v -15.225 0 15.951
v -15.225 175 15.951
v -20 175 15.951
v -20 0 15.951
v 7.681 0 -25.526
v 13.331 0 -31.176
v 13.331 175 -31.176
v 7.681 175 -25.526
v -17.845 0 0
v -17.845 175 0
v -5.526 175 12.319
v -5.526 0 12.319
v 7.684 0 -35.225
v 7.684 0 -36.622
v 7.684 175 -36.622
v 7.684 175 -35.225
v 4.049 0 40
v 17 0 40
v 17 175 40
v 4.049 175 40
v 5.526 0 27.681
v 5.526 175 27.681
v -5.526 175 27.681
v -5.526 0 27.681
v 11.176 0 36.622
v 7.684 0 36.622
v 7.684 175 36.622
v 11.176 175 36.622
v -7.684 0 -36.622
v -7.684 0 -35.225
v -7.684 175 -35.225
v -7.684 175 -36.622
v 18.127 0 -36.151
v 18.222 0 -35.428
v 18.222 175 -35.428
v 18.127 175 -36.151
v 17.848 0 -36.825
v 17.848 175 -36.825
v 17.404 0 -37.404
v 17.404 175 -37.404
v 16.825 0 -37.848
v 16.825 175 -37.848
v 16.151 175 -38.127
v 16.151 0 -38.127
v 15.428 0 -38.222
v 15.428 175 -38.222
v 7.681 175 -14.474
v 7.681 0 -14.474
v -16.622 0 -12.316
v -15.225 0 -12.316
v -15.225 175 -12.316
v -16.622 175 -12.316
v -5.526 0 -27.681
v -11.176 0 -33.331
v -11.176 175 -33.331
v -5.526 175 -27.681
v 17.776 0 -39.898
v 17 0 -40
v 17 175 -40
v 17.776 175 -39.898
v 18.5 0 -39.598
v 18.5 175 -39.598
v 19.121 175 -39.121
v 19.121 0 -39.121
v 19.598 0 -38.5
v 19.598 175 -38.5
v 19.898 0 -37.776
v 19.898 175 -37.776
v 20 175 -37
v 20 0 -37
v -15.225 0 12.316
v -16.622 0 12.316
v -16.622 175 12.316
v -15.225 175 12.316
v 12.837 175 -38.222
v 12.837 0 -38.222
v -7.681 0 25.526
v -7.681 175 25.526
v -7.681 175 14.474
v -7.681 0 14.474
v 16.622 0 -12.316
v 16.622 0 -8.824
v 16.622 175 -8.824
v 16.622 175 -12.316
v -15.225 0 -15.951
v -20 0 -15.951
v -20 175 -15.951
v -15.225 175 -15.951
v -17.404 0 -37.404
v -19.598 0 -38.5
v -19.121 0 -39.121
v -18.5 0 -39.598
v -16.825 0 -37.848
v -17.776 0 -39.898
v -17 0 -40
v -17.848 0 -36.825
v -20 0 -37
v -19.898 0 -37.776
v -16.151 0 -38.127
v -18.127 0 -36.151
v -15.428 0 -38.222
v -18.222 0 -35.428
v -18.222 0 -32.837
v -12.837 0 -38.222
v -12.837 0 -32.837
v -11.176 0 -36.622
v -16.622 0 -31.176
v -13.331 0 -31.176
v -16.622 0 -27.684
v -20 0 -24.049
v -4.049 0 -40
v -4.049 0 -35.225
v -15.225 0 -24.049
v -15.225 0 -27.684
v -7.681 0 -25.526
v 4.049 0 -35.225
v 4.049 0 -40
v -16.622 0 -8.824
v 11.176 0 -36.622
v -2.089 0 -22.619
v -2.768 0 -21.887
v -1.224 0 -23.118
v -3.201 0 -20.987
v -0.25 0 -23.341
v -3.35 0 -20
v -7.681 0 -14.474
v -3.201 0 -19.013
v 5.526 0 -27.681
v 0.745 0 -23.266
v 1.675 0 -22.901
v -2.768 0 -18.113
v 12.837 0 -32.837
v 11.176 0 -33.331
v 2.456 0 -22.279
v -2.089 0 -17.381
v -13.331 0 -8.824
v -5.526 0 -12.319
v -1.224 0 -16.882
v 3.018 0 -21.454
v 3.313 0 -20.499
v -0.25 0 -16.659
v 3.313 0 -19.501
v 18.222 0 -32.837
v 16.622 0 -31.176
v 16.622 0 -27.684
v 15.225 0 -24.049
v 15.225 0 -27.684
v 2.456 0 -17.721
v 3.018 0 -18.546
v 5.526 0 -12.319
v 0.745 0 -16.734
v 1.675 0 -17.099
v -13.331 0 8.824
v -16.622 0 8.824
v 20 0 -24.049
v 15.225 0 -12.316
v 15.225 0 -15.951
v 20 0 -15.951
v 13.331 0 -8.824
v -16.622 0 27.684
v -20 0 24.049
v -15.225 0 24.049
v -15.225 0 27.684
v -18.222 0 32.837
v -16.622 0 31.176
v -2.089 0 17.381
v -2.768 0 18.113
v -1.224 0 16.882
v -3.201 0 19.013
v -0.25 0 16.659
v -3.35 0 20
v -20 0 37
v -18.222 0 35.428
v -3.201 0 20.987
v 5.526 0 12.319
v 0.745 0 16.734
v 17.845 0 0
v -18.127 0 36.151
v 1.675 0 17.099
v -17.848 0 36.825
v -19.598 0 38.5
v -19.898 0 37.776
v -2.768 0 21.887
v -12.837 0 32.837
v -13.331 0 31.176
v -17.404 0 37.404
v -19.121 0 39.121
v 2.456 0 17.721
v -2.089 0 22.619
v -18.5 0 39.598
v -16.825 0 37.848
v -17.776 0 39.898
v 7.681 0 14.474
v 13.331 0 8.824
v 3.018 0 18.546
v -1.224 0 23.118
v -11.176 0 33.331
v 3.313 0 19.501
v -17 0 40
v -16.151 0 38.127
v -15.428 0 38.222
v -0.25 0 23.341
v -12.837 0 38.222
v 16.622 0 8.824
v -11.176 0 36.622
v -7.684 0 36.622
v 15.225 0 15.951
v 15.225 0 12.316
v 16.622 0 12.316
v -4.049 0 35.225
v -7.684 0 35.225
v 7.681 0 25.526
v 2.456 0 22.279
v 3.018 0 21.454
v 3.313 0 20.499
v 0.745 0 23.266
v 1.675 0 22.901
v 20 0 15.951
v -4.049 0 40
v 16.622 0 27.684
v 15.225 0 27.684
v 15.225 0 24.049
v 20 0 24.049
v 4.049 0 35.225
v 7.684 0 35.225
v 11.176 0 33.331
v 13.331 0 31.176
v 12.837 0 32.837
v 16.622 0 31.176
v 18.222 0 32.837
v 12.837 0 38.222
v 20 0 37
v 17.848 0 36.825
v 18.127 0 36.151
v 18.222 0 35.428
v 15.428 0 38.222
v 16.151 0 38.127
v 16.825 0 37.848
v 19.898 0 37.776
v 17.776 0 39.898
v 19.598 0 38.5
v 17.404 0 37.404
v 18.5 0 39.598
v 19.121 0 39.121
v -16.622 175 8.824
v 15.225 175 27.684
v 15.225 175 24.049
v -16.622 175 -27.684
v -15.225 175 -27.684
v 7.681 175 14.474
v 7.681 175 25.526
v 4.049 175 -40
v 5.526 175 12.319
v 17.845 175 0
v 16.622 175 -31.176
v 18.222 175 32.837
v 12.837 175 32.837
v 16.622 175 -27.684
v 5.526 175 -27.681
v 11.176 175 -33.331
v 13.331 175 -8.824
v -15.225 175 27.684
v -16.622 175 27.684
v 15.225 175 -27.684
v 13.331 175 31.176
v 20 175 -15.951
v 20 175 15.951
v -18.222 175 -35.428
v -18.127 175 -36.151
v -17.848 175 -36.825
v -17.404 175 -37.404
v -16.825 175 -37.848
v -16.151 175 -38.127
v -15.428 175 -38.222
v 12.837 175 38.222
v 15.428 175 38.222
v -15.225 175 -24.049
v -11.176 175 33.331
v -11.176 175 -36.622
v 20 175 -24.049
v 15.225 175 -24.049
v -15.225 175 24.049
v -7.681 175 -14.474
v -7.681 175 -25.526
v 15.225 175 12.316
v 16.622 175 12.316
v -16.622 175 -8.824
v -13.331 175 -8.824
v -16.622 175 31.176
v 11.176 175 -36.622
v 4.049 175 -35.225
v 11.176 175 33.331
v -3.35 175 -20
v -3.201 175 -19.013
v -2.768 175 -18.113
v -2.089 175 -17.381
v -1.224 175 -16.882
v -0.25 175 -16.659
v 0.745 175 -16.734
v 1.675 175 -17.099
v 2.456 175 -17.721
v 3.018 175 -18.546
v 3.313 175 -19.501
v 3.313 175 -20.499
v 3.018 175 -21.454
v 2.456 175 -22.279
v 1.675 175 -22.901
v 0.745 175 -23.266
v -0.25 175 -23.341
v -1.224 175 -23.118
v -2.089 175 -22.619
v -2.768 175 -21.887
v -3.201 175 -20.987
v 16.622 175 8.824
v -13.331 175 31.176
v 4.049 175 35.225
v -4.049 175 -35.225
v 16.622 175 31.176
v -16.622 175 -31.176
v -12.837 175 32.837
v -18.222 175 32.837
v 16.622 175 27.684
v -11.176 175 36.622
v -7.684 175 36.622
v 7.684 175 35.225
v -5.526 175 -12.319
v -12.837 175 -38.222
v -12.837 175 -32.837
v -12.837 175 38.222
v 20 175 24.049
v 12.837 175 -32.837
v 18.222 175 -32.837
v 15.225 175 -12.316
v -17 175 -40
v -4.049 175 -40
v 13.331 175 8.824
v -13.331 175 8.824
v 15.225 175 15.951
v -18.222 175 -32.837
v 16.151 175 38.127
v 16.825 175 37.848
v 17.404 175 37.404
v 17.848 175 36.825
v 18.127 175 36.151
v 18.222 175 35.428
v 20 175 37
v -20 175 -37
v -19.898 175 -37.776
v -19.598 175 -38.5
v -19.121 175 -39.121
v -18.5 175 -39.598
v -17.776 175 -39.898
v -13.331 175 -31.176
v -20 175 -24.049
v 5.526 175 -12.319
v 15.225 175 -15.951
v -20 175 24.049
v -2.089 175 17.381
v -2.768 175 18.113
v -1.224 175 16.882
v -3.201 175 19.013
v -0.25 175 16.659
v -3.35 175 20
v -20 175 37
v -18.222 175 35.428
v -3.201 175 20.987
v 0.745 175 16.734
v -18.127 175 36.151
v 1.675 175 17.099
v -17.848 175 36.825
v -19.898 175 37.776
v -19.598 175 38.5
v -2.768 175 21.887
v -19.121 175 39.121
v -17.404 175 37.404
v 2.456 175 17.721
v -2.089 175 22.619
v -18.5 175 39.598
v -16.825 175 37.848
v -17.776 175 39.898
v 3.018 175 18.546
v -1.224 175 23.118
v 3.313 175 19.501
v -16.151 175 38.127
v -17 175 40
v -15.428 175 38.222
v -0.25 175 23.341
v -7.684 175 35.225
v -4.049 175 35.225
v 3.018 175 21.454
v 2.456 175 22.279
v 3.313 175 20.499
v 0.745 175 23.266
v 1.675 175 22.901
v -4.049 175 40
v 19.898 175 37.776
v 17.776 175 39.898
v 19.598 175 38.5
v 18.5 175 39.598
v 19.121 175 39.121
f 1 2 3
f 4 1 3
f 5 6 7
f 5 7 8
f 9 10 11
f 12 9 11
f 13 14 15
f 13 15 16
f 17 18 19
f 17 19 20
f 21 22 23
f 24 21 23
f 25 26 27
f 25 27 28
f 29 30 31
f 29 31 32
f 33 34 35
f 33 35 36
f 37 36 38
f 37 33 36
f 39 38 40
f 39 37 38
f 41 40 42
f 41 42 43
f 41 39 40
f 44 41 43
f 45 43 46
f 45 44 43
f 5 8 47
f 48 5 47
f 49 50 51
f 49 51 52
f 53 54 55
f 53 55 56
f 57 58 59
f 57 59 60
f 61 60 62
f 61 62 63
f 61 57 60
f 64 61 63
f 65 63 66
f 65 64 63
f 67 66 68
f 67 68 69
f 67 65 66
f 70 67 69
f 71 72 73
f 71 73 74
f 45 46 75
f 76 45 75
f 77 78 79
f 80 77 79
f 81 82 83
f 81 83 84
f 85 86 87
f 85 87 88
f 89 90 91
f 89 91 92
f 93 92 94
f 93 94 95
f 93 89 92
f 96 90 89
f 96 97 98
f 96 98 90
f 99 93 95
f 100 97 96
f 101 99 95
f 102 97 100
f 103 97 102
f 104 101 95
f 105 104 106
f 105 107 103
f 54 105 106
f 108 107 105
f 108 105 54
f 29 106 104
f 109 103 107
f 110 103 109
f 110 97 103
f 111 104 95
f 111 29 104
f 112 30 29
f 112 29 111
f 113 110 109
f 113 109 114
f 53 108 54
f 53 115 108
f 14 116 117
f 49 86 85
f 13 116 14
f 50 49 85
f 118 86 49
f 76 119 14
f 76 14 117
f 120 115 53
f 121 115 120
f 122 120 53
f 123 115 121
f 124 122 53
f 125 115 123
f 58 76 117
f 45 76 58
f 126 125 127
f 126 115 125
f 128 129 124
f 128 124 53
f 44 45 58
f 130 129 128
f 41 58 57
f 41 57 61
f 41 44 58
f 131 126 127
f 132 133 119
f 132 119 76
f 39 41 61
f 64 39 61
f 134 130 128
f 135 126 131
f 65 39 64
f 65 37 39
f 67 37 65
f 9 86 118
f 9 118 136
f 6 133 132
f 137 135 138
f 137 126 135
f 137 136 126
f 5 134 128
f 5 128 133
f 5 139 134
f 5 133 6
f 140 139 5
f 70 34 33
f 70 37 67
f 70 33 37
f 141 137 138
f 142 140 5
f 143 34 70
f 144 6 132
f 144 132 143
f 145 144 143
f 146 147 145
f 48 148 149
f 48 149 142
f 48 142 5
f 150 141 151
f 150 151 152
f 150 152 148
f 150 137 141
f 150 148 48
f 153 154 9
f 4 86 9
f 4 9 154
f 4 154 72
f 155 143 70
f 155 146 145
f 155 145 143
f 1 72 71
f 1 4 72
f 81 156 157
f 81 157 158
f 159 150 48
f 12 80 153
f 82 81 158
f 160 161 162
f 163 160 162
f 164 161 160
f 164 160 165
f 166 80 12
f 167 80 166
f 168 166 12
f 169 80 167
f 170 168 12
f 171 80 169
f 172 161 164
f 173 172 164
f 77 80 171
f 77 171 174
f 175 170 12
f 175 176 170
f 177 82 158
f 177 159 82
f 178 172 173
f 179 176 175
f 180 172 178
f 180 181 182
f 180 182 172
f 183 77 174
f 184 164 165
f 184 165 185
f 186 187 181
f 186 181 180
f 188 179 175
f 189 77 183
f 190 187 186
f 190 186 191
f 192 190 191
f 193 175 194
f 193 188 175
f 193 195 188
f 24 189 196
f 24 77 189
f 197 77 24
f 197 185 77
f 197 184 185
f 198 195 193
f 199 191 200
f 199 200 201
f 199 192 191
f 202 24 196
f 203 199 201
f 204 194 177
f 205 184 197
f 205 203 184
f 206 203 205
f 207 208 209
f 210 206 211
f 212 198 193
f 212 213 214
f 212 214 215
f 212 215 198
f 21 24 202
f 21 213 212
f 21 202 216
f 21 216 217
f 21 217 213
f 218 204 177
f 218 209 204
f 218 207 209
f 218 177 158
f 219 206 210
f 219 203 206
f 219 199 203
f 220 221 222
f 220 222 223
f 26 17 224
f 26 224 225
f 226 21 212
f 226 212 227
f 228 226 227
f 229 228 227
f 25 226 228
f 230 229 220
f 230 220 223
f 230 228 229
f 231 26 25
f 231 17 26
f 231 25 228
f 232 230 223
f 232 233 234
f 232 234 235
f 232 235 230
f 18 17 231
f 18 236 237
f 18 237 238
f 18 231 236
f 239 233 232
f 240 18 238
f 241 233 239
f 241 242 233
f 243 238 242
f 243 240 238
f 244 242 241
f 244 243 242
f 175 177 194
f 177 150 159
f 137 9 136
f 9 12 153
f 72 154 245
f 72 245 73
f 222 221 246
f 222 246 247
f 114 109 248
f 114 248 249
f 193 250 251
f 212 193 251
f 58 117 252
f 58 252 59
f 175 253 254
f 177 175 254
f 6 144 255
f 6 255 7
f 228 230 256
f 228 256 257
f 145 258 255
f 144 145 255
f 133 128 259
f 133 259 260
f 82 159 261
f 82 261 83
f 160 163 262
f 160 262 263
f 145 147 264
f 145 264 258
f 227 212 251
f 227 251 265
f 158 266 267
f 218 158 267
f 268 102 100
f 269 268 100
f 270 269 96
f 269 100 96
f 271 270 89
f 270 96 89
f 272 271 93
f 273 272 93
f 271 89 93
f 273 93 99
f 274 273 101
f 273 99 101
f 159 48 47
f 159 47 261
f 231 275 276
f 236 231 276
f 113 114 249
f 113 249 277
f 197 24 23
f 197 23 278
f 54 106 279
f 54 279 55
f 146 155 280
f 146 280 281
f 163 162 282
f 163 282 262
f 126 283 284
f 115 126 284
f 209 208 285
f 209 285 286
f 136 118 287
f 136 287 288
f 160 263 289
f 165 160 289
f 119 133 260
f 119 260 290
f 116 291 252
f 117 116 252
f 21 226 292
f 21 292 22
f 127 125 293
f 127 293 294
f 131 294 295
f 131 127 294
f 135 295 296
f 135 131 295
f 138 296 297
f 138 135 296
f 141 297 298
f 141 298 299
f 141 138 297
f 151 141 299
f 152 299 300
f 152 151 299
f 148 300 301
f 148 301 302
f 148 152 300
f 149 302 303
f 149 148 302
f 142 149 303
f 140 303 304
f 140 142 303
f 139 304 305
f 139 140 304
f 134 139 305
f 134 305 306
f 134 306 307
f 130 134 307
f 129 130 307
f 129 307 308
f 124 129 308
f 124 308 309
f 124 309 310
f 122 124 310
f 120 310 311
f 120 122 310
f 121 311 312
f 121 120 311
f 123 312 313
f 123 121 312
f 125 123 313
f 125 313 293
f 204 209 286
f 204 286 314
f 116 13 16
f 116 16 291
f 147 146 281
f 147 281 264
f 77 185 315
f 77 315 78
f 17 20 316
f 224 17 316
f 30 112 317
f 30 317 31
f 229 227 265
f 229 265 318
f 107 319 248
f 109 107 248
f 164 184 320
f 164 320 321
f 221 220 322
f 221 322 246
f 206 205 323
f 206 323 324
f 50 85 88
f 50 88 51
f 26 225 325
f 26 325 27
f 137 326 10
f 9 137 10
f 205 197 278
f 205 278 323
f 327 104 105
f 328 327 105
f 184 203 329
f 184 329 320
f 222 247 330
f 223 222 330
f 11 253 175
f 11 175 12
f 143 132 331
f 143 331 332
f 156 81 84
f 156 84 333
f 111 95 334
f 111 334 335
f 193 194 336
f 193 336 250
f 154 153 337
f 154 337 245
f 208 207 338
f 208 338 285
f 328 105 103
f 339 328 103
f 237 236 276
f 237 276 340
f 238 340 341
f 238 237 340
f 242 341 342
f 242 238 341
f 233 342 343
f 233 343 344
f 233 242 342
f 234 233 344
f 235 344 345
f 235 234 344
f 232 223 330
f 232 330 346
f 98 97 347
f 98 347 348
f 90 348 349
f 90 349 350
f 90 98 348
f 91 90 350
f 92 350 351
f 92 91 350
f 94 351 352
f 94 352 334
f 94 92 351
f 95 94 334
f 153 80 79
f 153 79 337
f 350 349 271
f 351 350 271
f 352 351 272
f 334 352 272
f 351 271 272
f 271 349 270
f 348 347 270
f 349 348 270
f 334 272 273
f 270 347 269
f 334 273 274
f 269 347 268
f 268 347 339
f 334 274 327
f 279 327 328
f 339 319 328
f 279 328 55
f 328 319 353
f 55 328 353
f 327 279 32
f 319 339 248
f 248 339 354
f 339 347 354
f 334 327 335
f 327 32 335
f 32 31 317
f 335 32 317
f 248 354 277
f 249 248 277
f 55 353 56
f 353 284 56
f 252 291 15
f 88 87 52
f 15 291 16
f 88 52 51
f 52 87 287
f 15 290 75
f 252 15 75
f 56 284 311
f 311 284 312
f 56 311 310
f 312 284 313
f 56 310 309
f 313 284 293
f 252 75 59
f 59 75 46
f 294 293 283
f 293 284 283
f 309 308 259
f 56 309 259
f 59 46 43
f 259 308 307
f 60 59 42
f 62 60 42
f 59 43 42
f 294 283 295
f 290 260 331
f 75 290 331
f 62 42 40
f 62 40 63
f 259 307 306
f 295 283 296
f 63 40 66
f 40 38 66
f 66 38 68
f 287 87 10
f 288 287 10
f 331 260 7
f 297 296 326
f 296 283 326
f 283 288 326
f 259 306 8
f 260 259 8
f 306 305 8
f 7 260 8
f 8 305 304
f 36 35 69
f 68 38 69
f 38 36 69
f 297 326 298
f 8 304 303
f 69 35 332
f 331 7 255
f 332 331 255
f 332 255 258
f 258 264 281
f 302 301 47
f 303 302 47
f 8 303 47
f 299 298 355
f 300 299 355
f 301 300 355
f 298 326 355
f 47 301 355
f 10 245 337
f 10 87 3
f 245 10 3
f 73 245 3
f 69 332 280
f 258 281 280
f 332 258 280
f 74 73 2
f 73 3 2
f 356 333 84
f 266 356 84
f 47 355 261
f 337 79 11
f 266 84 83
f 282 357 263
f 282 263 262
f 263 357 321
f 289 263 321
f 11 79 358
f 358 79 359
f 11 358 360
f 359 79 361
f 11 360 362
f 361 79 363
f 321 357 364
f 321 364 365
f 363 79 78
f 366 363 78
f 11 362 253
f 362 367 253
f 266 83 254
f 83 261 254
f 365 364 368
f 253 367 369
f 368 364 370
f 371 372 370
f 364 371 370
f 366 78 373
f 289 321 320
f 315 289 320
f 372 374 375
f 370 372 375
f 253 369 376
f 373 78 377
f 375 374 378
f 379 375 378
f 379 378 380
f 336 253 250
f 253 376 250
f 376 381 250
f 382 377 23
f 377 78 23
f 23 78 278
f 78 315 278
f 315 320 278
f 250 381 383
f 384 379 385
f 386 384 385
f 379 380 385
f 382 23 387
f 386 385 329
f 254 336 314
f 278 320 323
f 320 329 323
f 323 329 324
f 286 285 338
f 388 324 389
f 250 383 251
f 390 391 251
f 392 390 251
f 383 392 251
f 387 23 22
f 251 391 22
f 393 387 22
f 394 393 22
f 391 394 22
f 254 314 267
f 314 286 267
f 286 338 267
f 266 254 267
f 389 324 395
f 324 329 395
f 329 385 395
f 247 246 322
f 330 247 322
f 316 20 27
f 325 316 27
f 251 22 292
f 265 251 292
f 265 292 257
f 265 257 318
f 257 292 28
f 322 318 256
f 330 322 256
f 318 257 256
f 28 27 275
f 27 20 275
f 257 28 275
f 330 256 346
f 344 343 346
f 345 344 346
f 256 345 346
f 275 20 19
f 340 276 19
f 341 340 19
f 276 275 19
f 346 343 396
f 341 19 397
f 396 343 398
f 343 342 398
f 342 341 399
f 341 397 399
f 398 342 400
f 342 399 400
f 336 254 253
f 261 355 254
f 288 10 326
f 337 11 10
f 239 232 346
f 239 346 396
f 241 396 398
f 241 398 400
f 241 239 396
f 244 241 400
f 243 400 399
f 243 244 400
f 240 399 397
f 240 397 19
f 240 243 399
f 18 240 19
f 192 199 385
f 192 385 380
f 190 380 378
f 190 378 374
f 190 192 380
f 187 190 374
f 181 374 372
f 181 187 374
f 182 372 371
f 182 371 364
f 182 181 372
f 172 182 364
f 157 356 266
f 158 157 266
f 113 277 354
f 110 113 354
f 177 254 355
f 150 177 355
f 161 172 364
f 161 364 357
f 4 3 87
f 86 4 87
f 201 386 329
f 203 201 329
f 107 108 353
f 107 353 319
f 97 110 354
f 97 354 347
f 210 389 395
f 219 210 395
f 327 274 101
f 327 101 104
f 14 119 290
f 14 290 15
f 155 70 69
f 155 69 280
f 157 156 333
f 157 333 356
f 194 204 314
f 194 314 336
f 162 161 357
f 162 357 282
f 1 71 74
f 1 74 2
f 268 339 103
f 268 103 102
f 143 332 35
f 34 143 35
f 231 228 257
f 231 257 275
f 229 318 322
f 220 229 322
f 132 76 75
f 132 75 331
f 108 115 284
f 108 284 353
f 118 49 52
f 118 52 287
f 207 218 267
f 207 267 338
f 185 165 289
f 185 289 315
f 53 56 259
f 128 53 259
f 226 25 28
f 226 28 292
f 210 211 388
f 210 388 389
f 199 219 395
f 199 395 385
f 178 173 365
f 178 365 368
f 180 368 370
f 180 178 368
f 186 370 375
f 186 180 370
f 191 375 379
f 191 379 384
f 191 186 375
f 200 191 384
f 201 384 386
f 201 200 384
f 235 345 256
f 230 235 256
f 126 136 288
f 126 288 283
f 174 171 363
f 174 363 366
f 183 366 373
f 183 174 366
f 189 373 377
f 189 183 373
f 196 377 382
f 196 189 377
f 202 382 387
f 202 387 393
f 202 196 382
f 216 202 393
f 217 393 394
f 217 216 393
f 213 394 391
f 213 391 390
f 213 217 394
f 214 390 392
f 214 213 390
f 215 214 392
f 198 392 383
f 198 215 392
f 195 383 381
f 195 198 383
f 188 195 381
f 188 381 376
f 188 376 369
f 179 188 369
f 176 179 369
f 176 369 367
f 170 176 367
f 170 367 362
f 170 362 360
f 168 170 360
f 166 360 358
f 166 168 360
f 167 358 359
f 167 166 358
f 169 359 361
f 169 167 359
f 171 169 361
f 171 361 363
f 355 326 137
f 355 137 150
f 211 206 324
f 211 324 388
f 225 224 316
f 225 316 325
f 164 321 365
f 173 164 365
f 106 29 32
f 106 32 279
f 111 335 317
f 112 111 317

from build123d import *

# Parameters (mm, degrees)
SKETCH2_R                            = 3.35
F_40_SERIES_TS40_80LM_650037_1_DEPTH = 175


with BuildPart() as part:
    # Sketch2 → 40 series TS40-80LM-650037(1) (new body)
    with BuildSketch(Plane(origin=(0, 0, 0), x_dir=(-1, 0, 0), z_dir=(0, 1, 0))):
        with BuildLine():
            Line((0, -27.681), (-5.525738531, -27.681))
            Line((-5.525738531, -27.681), (-11.176, -33.331261469))
            Line((-11.176, -33.331261469), (-11.176, -36.6218))
            Line((-11.176, -36.6218), (-7.6835, -36.6218))
            Line((-7.6835, -36.6218), (-7.6835, -35.2248))
            Line((-7.6835, -35.2248), (-4.0488, -35.2248))
            Line((-4.0488, -35.2248), (-4.0488, -40))
            Line((-4.0488, -40), (-17, -40))
            ThreePointArc((-17, -40), (-19.121320344, -39.121320344), (-20, -37))
            Line((-20, -37), (-20, -24.0488))
            Line((-20, -24.0488), (-15.2248, -24.0488))
            Line((-15.2248, -24.0488), (-15.2248, -27.6835))
            Line((-15.2248, -27.6835), (-16.6218, -27.6835))
            Line((-16.6218, -27.6835), (-16.6218, -31.176))
            Line((-16.6218, -31.176), (-13.331261469, -31.176))
            Line((-13.331261469, -31.176), (-7.681, -25.525738531))
            Line((-7.681, -25.525738531), (-7.681, -20))
            Line((-7.681, -20), (-7.681, -14.474261469))
            Line((-7.681, -14.474261469), (-13.331261469, -8.824))
            Line((-13.331261469, -8.824), (-16.6218, -8.824))
            Line((-16.6218, -8.824), (-16.6218, -12.3165))
            Line((-16.6218, -12.3165), (-15.2248, -12.3165))
            Line((-15.2248, -12.3165), (-15.2248, -15.9512))
            Line((-15.2248, -15.9512), (-20, -15.9512))
            Line((-20, -15.9512), (-20, 15.9512))
            Line((-20, 15.9512), (-15.2248, 15.9512))
            Line((-15.2248, 15.9512), (-15.2248, 12.3165))
            Line((-15.2248, 12.3165), (-16.6218, 12.3165))
            Line((-16.6218, 12.3165), (-16.6218, 8.824))
            Line((-16.6218, 8.824), (-13.331261469, 8.824))
            Line((-13.331261469, 8.824), (-7.681, 14.474261469))
            Line((-7.681, 14.474261469), (-7.681, 25.525738531))
            Line((-7.681, 25.525738531), (-13.331261469, 31.176))
            Line((-13.331261469, 31.176), (-16.6218, 31.176))
            Line((-16.6218, 31.176), (-16.6218, 27.6835))
            Line((-16.6218, 27.6835), (-15.2248, 27.6835))
            Line((-15.2248, 27.6835), (-15.2248, 24.0488))
            Line((-15.2248, 24.0488), (-20, 24.0488))
            Line((-20, 24.0488), (-20, 37))
            ThreePointArc((-20, 37), (-19.121320344, 39.121320344), (-17, 40))
            Line((-17, 40), (-4.0488, 40))
            Line((-4.0488, 40), (-4.0488, 35.2248))
            Line((-4.0488, 35.2248), (-7.6835, 35.2248))
            Line((-7.6835, 35.2248), (-7.6835, 36.6218))
            Line((-7.6835, 36.6218), (-11.176, 36.6218))
            Line((-11.176, 36.6218), (-11.176, 33.331261469))
            Line((-11.176, 33.331261469), (-5.525738531, 27.681))
            Line((-5.525738531, 27.681), (0, 27.681))
            Line((0, 27.681), (5.525738531, 27.681))
            Line((5.525738531, 27.681), (11.176, 33.331261469))
            Line((11.176, 33.331261469), (11.176, 36.6218))
            Line((11.176, 36.6218), (7.6835, 36.6218))
            Line((7.6835, 36.6218), (7.6835, 35.2248))
            Line((7.6835, 35.2248), (4.0488, 35.2248))
            Line((4.0488, 35.2248), (4.0488, 40))
            Line((4.0488, 40), (17, 40))
            ThreePointArc((17, 40), (19.121320344, 39.121320344), (20, 37))
            Line((20, 37), (20, 24.0488))
            Line((20, 24.0488), (15.2248, 24.0488))
            Line((15.2248, 24.0488), (15.2248, 27.6835))
            Line((15.2248, 27.6835), (16.6218, 27.6835))
            Line((16.6218, 27.6835), (16.6218, 31.176))
            Line((16.6218, 31.176), (13.331261469, 31.176))
            Line((13.331261469, 31.176), (7.681, 25.525738531))
            Line((7.681, 25.525738531), (7.681, 20))
            Line((7.681, 20), (7.681, 14.474261469))
            Line((7.681, 14.474261469), (13.331261469, 8.824))
            Line((13.331261469, 8.824), (16.6218, 8.824))
            Line((16.6218, 8.824), (16.6218, 12.3165))
            Line((16.6218, 12.3165), (15.2248, 12.3165))
            Line((15.2248, 12.3165), (15.2248, 15.9512))
            Line((15.2248, 15.9512), (20, 15.9512))
            Line((20, 15.9512), (20, -15.9512))
            Line((20, -15.9512), (15.2248, -15.9512))
            Line((15.2248, -15.9512), (15.2248, -12.3165))
            Line((15.2248, -12.3165), (16.6218, -12.3165))
            Line((16.6218, -12.3165), (16.6218, -8.824))
            Line((16.6218, -8.824), (13.331261469, -8.824))
            Line((13.331261469, -8.824), (7.681, -14.474261469))
            Line((7.681, -14.474261469), (7.681, -20))
            Line((7.681, -20), (7.681, -25.525738531))
            Line((7.681, -25.525738531), (13.331261469, -31.176))
            Line((13.331261469, -31.176), (16.6218, -31.176))
            Line((16.6218, -31.176), (16.6218, -27.6835))
            Line((16.6218, -27.6835), (15.2248, -27.6835))
            Line((15.2248, -27.6835), (15.2248, -24.0488))
            Line((15.2248, -24.0488), (20, -24.0488))
            Line((20, -24.0488), (20, -37))
            ThreePointArc((20, -37), (19.121320344, -39.121320344), (17, -40))
            Line((17, -40), (4.0488, -40))
            Line((4.0488, -40), (4.0488, -35.2248))
            Line((4.0488, -35.2248), (7.6835, -35.2248))
            Line((7.6835, -35.2248), (7.6835, -36.6218))
            Line((7.6835, -36.6218), (11.176, -36.6218))
            Line((11.176, -36.6218), (11.176, -33.331261469))
            Line((11.176, -33.331261469), (5.525738531, -27.681))
            Line((5.525738531, -27.681), (0, -27.681))
        make_face()
        with Locations((0, -20)):
            Circle(SKETCH2_R, mode=Mode.SUBTRACT)
        with Locations((0, 20)):
            Circle(SKETCH2_R, mode=Mode.SUBTRACT)
        Polygon((-5.525738531, 12.319), (-17.844738531, 0), (-5.525738531, -12.319), (0, -12.319), (5.525738531, -12.319), (17.844738531, 0), (5.525738531, 12.319), (0, 12.319), align=None, mode=Mode.SUBTRACT)
        with BuildLine():
            Line((12.8372, 38.222), (12.8372, 32.8372))
            Line((12.8372, 32.8372), (18.222, 32.8372))
            Line((18.222, 32.8372), (18.222, 35.428))
            ThreePointArc((18.222, 35.428), (17.403656347, 37.403656347), (15.428, 38.222))
            Line((15.428, 38.222), (12.8372, 38.222))
        make_face(mode=Mode.SUBTRACT)
        with BuildLine():
            Line((12.8372, -32.8372), (18.222, -32.8372))
            Line((18.222, -32.8372), (18.222, -35.428))
            ThreePointArc((18.222, -35.428), (17.403656347, -37.403656347), (15.428, -38.222))
            Line((15.428, -38.222), (12.8372, -38.222))
            Line((12.8372, -38.222), (12.8372, -32.8372))
        make_face(mode=Mode.SUBTRACT)
        with BuildLine():
            Line((-12.8372, -38.222), (-12.8372, -32.8372))
            Line((-12.8372, -32.8372), (-18.222, -32.8372))
            Line((-18.222, -32.8372), (-18.222, -35.428))
            ThreePointArc((-18.222, -35.428), (-17.403656347, -37.403656347), (-15.428, -38.222))
            Line((-15.428, -38.222), (-12.8372, -38.222))
        make_face(mode=Mode.SUBTRACT)
        with BuildLine():
            Line((-18.222, 35.428), (-18.222, 32.8372))
            Line((-18.222, 32.8372), (-12.8372, 32.8372))
            Line((-12.8372, 32.8372), (-12.8372, 38.222))
            Line((-12.8372, 38.222), (-15.428, 38.222))
            ThreePointArc((-15.428, 38.222), (-17.403656347, 37.403656347), (-18.222, 35.428))
        make_face(mode=Mode.SUBTRACT)
    extrude(amount=F_40_SERIES_TS40_80LM_650037_1_DEPTH)


solid = part.part
